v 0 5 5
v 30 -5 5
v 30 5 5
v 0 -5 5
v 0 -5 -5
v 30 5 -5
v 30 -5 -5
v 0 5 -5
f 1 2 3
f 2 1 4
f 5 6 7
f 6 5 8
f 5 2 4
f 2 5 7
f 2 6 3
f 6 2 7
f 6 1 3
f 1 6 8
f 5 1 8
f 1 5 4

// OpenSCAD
// Geometry is cache-stable across frames; only the transforms depend on $t.
color("red") translate([100 * $t, 0, 0]) rotate([0, 0, 360 * $t])
  translate([15, 0, 0]) cube([30, 10, 10], center = true);
